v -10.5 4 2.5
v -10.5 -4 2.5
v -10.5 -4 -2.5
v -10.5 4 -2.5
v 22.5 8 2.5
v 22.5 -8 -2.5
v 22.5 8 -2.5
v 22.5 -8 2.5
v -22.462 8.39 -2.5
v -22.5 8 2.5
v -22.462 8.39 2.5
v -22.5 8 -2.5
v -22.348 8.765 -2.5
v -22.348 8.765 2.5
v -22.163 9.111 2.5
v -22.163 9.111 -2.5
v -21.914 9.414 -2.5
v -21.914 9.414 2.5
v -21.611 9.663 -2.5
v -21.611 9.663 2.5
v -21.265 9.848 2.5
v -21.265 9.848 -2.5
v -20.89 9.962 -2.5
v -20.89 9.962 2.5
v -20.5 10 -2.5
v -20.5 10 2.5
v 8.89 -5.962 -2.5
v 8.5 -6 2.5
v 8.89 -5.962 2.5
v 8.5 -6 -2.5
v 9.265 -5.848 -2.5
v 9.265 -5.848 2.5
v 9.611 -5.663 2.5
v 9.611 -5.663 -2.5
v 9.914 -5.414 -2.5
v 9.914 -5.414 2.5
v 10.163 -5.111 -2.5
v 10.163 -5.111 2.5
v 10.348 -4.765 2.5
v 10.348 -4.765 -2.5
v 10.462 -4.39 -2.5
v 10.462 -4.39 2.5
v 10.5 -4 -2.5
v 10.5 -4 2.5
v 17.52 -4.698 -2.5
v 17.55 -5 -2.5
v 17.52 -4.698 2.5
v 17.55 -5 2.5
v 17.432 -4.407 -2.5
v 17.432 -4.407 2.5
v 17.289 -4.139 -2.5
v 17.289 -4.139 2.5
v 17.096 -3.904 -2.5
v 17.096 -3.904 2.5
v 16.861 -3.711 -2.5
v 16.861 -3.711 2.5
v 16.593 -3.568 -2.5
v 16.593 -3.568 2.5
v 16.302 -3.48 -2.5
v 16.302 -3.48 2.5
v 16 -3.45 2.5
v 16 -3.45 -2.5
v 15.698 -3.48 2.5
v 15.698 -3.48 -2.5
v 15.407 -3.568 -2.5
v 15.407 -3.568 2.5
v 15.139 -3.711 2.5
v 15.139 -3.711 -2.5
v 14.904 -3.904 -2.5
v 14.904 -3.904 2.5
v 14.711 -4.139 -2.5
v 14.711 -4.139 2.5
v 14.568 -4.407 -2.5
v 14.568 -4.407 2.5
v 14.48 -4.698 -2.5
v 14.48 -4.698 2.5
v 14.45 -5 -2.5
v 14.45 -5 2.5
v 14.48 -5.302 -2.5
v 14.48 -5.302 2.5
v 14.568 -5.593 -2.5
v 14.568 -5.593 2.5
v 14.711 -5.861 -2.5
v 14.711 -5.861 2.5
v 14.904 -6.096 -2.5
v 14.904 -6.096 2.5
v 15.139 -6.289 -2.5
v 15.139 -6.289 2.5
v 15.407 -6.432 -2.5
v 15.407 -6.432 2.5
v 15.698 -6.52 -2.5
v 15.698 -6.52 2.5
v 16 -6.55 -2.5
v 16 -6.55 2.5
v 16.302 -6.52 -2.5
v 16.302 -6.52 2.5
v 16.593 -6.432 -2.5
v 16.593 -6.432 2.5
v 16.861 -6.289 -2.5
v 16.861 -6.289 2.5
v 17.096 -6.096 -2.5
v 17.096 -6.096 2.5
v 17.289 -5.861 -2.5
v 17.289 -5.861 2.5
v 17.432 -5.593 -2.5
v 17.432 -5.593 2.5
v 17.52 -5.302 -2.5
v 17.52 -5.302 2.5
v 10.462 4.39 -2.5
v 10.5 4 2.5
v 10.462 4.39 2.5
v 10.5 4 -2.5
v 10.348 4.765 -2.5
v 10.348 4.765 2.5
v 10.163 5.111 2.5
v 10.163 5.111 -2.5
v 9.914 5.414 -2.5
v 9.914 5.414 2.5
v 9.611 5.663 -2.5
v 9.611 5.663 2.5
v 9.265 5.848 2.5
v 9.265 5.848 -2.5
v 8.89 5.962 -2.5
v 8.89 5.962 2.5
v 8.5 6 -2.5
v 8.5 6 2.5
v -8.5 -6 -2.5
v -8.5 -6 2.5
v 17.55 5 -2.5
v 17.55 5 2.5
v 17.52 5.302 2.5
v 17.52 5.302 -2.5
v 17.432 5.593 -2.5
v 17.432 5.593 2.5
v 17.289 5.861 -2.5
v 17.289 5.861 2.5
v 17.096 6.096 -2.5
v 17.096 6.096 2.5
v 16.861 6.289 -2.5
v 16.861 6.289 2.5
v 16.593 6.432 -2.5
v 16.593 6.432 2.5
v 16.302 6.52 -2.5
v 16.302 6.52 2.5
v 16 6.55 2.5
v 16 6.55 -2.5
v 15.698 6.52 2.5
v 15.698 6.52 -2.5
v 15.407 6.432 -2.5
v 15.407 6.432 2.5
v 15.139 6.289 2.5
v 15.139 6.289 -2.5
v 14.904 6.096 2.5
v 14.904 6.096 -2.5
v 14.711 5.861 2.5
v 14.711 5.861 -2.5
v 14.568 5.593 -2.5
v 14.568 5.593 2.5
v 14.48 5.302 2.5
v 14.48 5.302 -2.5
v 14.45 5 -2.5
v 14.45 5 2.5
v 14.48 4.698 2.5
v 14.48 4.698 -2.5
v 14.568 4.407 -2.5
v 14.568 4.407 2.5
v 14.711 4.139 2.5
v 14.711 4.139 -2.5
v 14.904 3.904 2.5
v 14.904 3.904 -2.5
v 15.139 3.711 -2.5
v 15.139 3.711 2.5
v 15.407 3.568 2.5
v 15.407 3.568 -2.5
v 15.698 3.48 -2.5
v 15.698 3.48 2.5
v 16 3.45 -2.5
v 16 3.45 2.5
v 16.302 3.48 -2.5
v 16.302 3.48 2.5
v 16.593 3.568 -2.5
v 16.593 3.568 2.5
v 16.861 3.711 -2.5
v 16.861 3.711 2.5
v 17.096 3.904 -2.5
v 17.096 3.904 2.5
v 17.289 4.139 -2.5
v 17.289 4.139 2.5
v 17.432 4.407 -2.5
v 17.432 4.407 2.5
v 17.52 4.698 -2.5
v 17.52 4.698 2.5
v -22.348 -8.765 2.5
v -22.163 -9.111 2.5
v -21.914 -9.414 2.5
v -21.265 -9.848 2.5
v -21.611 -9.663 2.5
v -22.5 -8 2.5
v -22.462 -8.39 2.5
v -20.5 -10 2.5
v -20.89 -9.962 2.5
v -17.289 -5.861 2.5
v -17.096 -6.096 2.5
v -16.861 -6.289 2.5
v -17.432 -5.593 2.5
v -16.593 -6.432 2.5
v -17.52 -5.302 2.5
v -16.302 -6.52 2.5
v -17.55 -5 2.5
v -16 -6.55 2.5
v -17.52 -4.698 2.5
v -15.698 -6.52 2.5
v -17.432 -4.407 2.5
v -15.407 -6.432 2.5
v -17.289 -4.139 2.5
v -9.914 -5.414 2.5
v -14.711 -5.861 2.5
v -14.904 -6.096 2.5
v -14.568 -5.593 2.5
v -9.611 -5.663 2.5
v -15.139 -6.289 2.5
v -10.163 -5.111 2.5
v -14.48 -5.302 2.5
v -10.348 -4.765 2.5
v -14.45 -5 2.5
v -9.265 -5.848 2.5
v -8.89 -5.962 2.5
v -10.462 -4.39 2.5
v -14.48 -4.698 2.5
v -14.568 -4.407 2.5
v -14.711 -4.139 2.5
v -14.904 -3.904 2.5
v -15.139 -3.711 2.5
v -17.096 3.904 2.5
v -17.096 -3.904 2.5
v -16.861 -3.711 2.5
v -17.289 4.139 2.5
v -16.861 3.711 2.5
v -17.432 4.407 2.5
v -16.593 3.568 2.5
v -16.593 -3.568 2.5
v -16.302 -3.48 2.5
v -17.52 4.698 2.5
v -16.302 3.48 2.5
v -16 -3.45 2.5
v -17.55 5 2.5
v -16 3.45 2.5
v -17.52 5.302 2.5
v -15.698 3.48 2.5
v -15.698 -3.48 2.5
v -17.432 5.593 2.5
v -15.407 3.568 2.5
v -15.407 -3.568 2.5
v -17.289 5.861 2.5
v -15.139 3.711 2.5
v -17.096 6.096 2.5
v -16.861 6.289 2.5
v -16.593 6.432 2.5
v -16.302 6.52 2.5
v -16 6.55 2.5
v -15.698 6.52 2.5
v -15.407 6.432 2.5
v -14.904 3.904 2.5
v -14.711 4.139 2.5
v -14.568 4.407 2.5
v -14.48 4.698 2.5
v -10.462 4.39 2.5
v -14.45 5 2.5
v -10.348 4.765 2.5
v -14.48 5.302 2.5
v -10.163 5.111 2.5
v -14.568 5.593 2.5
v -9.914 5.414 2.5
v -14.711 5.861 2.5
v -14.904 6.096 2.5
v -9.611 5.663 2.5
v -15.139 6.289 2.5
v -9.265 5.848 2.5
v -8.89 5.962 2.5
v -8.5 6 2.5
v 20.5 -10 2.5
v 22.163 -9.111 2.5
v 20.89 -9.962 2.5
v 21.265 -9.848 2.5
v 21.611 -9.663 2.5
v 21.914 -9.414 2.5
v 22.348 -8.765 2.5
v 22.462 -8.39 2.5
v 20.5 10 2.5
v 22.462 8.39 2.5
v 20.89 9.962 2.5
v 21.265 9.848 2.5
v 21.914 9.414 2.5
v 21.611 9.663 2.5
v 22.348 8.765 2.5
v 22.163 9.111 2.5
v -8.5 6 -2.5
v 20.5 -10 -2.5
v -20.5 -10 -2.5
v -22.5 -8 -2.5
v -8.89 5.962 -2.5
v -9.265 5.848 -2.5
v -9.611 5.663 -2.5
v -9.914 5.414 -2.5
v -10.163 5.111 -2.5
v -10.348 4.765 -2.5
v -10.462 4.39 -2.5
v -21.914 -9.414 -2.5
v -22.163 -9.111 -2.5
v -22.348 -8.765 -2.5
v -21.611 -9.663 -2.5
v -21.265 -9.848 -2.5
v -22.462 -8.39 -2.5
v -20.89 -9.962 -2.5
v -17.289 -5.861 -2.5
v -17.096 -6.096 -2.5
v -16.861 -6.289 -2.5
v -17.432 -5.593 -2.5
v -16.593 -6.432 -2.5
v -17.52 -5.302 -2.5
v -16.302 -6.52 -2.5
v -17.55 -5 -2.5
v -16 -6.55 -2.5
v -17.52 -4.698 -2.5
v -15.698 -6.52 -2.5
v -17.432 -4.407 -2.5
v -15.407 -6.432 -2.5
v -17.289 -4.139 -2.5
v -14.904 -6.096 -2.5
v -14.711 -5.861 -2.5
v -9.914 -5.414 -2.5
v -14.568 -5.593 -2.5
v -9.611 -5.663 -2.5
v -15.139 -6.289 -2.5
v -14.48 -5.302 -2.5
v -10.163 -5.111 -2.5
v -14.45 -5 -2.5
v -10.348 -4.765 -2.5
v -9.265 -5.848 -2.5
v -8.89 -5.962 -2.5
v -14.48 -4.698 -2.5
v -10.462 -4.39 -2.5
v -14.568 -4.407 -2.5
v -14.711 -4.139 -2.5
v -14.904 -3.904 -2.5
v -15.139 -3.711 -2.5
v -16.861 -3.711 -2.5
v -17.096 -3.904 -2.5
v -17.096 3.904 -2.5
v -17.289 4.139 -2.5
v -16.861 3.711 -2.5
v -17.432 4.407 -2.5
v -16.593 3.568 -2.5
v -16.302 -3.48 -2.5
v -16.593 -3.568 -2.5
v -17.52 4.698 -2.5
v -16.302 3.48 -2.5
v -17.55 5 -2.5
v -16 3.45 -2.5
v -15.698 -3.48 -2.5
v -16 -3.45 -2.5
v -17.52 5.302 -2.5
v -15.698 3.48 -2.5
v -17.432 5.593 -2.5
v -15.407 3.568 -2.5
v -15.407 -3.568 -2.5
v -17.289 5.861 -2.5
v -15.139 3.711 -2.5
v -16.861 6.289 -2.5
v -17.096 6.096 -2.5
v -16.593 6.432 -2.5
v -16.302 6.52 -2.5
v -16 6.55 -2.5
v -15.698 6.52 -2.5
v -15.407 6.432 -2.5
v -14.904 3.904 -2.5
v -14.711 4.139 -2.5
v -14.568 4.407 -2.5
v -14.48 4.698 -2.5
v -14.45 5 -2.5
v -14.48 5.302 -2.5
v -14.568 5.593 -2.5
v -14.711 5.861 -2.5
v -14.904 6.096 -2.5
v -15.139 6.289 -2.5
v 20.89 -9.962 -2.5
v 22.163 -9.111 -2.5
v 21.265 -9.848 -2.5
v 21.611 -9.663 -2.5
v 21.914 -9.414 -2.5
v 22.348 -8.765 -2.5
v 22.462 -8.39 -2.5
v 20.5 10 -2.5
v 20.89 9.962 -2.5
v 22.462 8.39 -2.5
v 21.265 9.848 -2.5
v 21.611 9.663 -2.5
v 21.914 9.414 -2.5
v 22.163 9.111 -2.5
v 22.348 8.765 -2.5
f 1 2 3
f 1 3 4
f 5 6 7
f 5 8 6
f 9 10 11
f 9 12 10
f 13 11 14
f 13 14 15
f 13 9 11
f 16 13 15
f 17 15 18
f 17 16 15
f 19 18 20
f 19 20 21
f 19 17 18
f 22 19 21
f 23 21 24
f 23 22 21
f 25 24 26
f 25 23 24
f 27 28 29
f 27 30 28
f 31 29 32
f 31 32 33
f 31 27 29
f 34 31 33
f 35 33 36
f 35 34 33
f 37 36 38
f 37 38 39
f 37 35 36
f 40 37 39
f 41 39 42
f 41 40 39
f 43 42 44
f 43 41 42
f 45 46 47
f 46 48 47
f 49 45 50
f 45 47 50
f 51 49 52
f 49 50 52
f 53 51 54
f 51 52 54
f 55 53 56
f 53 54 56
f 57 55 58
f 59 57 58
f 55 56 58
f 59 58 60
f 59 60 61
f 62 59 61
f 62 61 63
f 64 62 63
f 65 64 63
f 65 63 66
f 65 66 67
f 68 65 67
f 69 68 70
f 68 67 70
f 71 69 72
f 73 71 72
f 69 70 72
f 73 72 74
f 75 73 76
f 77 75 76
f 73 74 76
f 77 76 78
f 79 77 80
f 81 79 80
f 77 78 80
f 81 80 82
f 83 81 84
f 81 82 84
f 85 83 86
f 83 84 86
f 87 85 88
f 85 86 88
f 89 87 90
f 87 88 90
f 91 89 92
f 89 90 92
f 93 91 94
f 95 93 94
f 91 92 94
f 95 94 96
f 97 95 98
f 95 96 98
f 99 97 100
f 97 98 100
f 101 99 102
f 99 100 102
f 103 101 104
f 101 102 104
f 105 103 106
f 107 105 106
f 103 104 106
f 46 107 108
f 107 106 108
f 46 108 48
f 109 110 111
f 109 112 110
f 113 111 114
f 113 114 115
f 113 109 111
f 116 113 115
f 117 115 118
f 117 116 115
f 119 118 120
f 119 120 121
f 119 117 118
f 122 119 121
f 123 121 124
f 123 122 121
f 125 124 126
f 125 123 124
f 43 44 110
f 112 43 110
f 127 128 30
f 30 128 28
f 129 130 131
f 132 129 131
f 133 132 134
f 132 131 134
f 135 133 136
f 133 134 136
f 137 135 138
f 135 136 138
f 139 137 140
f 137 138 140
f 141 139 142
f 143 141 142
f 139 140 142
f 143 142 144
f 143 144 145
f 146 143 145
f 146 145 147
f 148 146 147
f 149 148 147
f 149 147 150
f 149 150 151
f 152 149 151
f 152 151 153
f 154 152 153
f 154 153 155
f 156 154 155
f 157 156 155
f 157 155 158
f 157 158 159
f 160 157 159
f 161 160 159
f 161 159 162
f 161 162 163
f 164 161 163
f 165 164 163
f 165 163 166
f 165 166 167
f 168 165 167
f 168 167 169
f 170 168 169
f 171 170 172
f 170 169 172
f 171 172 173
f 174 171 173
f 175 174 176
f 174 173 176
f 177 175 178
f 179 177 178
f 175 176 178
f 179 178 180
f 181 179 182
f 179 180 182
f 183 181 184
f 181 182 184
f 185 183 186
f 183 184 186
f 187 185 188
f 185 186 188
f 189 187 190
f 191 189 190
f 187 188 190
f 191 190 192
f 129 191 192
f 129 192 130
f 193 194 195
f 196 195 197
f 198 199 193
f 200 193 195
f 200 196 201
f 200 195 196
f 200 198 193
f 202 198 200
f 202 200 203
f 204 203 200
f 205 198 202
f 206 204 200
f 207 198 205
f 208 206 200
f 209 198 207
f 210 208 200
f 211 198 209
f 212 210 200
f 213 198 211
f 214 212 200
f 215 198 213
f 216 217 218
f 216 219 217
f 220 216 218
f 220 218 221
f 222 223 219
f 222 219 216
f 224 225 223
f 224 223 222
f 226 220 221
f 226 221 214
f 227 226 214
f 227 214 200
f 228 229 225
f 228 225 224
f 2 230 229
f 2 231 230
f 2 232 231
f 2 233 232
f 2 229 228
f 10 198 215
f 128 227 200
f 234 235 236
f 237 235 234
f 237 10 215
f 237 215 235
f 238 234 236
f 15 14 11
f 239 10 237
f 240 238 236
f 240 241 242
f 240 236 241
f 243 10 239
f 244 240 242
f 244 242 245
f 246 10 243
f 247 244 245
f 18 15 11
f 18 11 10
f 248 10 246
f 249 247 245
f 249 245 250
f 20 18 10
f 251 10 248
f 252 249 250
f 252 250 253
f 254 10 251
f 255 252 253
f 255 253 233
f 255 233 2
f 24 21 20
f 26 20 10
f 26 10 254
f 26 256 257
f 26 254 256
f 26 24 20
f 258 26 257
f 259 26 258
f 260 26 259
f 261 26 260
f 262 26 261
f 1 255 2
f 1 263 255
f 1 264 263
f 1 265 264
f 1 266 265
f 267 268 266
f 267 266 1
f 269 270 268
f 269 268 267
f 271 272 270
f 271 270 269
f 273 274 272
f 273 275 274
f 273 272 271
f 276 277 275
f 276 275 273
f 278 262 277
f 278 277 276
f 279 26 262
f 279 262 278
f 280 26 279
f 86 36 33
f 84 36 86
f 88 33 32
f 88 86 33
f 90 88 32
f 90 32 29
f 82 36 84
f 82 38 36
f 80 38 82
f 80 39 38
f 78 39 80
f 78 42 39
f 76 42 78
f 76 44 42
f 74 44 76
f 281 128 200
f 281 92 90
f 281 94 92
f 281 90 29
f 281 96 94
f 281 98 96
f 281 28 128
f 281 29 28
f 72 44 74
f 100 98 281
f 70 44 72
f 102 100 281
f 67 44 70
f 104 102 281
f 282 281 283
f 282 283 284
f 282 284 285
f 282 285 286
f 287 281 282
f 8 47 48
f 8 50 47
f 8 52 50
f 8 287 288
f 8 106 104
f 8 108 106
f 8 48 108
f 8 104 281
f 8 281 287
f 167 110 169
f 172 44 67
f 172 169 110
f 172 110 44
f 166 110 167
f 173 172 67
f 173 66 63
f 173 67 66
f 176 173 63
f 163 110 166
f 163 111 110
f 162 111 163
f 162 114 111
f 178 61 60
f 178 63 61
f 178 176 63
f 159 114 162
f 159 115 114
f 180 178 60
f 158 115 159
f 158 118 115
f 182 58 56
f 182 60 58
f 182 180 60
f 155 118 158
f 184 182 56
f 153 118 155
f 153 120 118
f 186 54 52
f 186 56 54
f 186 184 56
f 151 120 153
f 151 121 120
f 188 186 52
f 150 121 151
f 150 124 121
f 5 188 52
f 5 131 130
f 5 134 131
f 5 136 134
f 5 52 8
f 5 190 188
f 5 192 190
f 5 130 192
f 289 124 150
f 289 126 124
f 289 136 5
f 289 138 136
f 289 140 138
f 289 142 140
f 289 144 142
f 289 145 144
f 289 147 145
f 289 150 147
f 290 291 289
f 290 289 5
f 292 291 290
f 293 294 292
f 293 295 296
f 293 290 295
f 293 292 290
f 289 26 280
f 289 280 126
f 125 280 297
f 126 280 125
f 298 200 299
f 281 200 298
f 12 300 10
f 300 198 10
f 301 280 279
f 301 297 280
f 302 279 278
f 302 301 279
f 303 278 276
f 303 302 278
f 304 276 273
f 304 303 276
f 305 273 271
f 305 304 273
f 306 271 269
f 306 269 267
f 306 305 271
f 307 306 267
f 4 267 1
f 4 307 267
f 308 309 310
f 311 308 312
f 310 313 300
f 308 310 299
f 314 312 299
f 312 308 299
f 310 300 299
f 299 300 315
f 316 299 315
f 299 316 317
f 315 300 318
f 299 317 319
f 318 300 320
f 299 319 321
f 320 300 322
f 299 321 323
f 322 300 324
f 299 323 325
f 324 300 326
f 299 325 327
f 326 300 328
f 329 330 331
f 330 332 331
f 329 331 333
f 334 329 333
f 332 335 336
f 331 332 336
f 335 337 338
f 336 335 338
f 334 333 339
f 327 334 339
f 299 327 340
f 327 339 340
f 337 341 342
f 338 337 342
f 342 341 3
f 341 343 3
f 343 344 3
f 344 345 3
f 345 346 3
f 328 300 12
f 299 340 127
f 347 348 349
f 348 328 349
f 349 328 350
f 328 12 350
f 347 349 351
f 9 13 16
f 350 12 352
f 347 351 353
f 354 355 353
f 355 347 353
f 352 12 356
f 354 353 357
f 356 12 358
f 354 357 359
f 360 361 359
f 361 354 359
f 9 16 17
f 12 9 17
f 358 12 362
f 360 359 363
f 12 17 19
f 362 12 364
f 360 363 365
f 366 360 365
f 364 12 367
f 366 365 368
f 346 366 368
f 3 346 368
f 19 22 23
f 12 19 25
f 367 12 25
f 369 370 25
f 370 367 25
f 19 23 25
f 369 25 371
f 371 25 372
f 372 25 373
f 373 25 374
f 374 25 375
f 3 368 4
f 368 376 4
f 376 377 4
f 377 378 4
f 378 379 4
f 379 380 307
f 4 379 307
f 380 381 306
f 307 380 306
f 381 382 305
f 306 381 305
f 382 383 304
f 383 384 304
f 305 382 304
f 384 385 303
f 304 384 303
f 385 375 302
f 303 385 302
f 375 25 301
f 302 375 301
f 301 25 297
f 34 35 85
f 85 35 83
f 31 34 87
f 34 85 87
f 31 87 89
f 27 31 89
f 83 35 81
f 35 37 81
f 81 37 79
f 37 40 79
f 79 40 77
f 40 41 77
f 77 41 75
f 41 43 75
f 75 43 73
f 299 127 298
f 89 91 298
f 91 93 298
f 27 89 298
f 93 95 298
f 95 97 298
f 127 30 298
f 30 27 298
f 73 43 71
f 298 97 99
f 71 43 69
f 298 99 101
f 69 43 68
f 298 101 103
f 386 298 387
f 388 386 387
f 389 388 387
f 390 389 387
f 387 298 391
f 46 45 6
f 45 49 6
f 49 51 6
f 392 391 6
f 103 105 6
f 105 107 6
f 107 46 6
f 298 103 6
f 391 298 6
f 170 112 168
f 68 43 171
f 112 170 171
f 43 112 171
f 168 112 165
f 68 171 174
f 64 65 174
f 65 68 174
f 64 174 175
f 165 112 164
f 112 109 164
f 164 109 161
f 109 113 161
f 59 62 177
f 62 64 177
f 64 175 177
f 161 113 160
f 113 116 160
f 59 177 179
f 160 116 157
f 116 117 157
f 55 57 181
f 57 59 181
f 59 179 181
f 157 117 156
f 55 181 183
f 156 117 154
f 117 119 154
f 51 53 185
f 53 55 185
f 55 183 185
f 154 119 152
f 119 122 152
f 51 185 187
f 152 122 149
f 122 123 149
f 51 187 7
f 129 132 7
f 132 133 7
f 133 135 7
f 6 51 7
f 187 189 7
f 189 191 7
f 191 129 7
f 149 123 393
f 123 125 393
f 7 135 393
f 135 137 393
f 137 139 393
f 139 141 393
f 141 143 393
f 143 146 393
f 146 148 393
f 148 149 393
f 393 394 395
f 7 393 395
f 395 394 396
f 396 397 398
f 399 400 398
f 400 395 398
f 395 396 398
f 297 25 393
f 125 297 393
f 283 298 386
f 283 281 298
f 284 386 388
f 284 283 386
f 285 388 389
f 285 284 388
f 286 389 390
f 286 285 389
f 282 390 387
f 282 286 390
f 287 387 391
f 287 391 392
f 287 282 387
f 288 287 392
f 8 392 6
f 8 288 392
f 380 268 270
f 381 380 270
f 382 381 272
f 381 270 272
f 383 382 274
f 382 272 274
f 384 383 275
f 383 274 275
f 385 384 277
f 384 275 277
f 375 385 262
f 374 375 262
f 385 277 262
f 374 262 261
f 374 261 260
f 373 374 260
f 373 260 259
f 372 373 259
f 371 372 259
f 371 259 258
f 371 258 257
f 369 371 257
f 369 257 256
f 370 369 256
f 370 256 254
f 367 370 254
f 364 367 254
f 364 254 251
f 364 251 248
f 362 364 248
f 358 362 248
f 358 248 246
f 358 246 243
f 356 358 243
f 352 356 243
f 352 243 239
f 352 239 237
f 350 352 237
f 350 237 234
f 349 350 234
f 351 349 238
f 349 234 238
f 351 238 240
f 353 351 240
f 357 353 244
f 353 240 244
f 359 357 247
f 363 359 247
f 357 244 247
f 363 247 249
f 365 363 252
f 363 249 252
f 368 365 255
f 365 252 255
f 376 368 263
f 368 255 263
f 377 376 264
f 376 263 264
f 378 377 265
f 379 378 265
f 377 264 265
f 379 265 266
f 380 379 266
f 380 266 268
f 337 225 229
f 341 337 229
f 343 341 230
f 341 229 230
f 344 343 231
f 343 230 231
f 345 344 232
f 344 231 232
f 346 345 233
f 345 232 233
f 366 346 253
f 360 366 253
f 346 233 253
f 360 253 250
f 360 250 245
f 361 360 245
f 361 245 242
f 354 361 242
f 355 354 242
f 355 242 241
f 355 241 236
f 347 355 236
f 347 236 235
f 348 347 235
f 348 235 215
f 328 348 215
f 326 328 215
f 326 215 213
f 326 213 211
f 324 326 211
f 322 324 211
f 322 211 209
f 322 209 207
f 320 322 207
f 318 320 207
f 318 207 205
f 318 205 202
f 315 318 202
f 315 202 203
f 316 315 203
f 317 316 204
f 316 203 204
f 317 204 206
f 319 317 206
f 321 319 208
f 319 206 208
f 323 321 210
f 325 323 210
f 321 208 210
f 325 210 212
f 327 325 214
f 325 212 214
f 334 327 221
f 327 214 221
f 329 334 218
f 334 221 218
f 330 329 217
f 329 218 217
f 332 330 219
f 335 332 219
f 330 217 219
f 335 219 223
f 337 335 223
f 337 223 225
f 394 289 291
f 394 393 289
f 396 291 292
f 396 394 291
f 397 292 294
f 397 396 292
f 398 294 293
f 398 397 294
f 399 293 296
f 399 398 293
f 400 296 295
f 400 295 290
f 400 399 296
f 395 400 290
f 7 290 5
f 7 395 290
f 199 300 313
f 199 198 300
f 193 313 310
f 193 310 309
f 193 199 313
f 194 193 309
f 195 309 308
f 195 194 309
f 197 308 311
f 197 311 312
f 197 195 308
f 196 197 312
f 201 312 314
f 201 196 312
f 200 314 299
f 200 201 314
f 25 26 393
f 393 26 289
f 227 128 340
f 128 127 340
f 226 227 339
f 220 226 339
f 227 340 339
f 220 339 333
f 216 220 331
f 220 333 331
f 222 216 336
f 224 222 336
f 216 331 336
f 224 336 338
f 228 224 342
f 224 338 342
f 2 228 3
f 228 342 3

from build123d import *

# Parameters (mm, degrees)
SKETCH_1_W          = 45
SKETCH_1_H          = 20
EXTRUDE_1_DEPTH     = 2.5
SKETCH_3_R          = 1.55
CUT_EXTRUDE_1_DEPTH = 32.5
FILLET_1_R          = 2
SKETCH_4_W          = 21
SKETCH_4_H          = 12
CUT_EXTRUDE_2_DEPTH = 30
FILLET_2_R          = 2


with BuildPart() as part:
    # 草图1 → 凸台-拉伸1 (new body, symmetric)
    with BuildSketch(Plane.XY):
        Rectangle(SKETCH_1_W, SKETCH_1_H)
    extrude(amount=EXTRUDE_1_DEPTH, both=True)

    # 草图3 → 切除-拉伸1 (cut, symmetric)
    with BuildSketch(Plane.XY.offset(2.5)):
        with Locations((16, 5)):
            Circle(SKETCH_3_R)
        with Locations((-16, 5)):
            Circle(SKETCH_3_R)
        with Locations((-16, -5)):
            Circle(SKETCH_3_R)
        with Locations((16, -5)):
            Circle(SKETCH_3_R)
    extrude(amount=CUT_EXTRUDE_1_DEPTH, both=True, mode=Mode.SUBTRACT)

    # 圆角1
    fillet_1_edges = [part.edges().sort_by_distance(p)[0] for p in [
        (22.5, -10, 0),
        (-22.5, -10, 0),
        (-22.5, 10, 0),
        (22.5, 10, 0),
    ]]
    fillet(fillet_1_edges, radius=FILLET_1_R)

    # 草图4 → 切除-拉伸2 (cut)
    with BuildSketch(Plane.XY.offset(2.5)):
        Rectangle(SKETCH_4_W, SKETCH_4_H)
    extrude(amount=-CUT_EXTRUDE_2_DEPTH, mode=Mode.SUBTRACT)

    # 圆角2
    fillet_2_edges = [part.edges().sort_by_distance(p)[0] for p in [
        (10.5, 6, 0),
        (10.5, -6, 0),
        (-10.5, -6, 0),
        (-10.5, 6, 0),
    ]]
    fillet(fillet_2_edges, radius=FILLET_2_R)


solid = part.part
